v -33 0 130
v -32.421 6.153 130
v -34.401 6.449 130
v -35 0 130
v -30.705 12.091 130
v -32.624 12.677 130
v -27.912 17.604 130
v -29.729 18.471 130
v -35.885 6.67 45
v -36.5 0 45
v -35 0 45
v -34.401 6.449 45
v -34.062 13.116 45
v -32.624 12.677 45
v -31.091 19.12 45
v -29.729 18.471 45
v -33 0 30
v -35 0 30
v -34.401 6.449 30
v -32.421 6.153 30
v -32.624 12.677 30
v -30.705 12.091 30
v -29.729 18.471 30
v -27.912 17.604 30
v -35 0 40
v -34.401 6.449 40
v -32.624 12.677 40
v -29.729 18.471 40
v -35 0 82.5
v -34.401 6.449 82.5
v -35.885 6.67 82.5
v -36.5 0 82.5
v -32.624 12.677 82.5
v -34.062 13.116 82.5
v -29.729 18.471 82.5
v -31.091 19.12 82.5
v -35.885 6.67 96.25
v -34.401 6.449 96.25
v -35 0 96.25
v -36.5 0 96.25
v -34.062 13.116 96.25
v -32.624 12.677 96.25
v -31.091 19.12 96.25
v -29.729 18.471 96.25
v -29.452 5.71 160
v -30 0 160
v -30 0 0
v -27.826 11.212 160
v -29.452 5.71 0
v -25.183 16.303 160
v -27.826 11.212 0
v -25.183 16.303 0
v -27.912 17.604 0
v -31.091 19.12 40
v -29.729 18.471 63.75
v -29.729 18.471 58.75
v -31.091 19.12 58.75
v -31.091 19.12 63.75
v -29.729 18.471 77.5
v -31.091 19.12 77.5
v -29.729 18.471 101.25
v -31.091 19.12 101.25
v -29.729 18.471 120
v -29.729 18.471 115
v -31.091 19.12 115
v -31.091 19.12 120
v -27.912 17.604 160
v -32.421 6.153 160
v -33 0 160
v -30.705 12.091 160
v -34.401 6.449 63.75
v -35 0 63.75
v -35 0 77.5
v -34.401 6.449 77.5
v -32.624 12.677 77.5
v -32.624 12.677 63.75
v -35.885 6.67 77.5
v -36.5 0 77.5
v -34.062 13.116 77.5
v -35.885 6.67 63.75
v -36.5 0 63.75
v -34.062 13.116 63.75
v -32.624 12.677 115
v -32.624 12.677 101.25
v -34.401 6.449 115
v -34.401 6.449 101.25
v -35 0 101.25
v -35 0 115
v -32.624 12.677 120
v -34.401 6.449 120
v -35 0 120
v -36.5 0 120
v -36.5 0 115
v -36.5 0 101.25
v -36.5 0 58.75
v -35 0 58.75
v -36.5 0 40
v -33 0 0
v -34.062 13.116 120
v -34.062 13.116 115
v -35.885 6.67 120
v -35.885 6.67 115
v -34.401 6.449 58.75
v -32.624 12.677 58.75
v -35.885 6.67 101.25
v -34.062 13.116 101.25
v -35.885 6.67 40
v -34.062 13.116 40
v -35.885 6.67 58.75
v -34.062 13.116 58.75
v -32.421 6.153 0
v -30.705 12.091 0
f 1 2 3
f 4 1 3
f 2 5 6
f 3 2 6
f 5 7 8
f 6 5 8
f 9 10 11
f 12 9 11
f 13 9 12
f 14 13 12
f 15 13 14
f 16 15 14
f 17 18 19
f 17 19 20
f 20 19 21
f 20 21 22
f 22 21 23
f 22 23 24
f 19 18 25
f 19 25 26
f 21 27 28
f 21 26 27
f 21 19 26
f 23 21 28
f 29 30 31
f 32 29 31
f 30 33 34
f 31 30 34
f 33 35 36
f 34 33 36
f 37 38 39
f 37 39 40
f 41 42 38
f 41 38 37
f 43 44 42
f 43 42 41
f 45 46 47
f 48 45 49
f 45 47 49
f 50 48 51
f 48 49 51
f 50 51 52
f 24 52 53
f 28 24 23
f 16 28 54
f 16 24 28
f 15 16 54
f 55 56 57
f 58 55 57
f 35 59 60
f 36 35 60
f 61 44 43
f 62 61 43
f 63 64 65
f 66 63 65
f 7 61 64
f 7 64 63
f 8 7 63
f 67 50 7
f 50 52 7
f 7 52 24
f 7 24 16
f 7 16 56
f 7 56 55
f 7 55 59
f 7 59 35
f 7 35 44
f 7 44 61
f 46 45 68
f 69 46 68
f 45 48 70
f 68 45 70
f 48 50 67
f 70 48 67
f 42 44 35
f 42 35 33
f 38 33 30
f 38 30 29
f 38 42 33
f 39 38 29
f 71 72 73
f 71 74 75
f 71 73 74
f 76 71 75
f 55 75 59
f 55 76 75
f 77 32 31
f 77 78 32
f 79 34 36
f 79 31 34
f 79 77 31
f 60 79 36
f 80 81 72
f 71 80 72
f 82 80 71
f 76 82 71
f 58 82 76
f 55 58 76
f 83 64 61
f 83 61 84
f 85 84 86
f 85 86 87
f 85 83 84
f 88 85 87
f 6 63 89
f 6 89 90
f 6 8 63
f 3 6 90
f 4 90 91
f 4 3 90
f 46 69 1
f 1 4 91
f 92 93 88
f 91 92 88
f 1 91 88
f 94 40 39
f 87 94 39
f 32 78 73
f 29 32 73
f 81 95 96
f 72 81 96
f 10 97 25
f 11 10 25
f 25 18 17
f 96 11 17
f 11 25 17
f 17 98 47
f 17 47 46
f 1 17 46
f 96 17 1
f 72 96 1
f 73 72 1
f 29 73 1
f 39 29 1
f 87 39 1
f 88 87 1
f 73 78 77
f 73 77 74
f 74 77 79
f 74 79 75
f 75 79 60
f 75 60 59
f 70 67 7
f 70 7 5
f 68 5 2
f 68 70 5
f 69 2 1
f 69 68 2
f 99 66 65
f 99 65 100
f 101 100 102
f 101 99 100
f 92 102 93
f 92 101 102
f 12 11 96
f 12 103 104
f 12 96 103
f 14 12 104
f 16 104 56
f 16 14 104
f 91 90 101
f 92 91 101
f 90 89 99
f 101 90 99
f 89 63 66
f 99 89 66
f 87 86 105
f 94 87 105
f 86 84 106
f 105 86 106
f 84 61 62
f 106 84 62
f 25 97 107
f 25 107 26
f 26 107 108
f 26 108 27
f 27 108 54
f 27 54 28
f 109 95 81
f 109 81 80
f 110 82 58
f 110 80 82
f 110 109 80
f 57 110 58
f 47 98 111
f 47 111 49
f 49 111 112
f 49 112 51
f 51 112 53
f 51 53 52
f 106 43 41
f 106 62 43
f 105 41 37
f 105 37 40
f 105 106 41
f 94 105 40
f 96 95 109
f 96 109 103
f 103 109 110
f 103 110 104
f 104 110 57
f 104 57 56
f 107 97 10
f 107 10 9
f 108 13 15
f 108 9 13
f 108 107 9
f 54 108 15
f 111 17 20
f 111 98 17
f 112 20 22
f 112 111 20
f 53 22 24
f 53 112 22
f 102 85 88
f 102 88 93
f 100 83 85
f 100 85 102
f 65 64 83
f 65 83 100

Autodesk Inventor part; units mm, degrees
ref_plane "YZ Plane" through (0, 0, 0) normal (1, 0, 0) x (0, 1, 0)
ref_plane "XZ Plane" through (0, 0, 0) normal (0, 1, 0) x (-1, 0, 0)
ref_plane "XY Plane" through (0, 0, 0) normal (0, 0, 1) x (1, 0, 0)
sketch "Skizze1" plane through (0, 0, 0) normal (0, 0, 1) x (1, 0, 0)
  arc A0 (-15, 25.9808) -> (-30, 0) centre (0, 0) ccw
  line L0 (-15, 25.9808) -> (-16.8174, 28.3932)
  line L1 (-30, 0) -> (-33, 0)
  arc A1 (-16.8174, 28.3932) -> (-33, 0) centre (0, 0) ccw
extrude "Teil B1" add sketch "Skizze1" along normal blind 30
sketch "Skizze2" plane through (0, 0, 30) normal (0, 0, 1) x (1, 0, 0)
  arc A0 (-15, 25.9808) -> (-30, 0) centre (0, 0) ccw projected
  line L0 (-33, 0) -> (-30, 0) projected
  arc A1 (-15, 25.9808) -> (-30, 0) centre (0, 0) ccw
  arc A2 (-18.0278, 30) -> (-35, 0) centre (0, 0) ccw
  line L1 (-30, 0) -> (-35, 0)
  line L2 (-15, 25.9808) -> (-18.0278, 30)
  line L3 (-15, 25.9808) -> (-16.8174, 28.3932) projected
  dimension "d6" = 70
extrude "Teil C1" add sketch "Skizze2" along normal blind 10
sketch "Skizze3" plane through (0, 0, 40) normal (0, 0, 1) x (1, 0, 0)
  arc A0 (-15, 25.9808) -> (-30, 0) centre (0, 0) ccw projected
  line L0 (-33, 0) -> (-30, 0) projected
  arc A1 (-15, 25.9808) -> (-30, 0) centre (0, 0) ccw
  arc A2 (-18.935, 31.2044) -> (-36.5, 0) centre (0, 0) ccw
  line L1 (-30, 0) -> (-36.5, 0)
  line L2 (-15, 25.9808) -> (-16.8174, 28.3932) projected
  line L3 (-15, 25.9808) -> (-18.935, 31.2044)
  dimension "d9" = 73
extrude "Teil D1" add sketch "Skizze3" along normal blind 5
sketch "Skizze4" plane through (0, 0, 45) normal (0, 0, 1) x (1, 0, 0)
  arc A0 (-18.0278, 30) -> (-35, 0) centre (0, 0) ccw
  arc A1 (-15, 25.9808) -> (-30, 0) centre (0, 0) ccw projected
  arc A2 (-15, 25.9808) -> (-30, 0) centre (0, 0) ccw
  line L0 (-16.8174, 28.3932) -> (-18.0278, 30) projected
  line L1 (-15, 25.9808) -> (-18.0278, 30)
  line L2 (-36.5, 0) -> (-35, 0) projected
  line L3 (-30, 0) -> (-35, 0)
extrude "Teil E1" add sketch "Skizze4" along normal blind 13.75
sketch "Skizze5" plane through (0, 0, 58.75) normal (0, 0, 1) x (1, 0, 0)
  arc A0 (-15, 25.9808) -> (-30, 0) centre (0, 0) ccw projected
  arc A1 (-15, 25.9808) -> (-30, 0) centre (0, 0) ccw
  arc A2 (-18.935, 31.2044) -> (-36.5, 0) centre (0, 0) ccw projected
  line L0 (-36.5, 0) -> (-35, 0) projected
  arc A3 (-18.935, 31.2044) -> (-36.5, 0) centre (0, 0) ccw
  line L1 (-33, 0) -> (-30, 0) projected
  line L2 (-36.5, 0) -> (-30, 0)
  line L3 (-15, 25.9808) -> (-18.935, 31.2044)
  point P0 (-15, 25.9808)
extrude "Teil D2" add sketch "Skizze5" along normal blind 5
sketch "Skizze6" plane through (0, 0, 63.75) normal (0, 0, 1) x (1, 0, 0)
  line L0 (-33, 0) -> (-30, 0) projected
  arc A0 (-15, 25.9808) -> (-30, 0) centre (0, 0) ccw
  arc A1 (-18.0278, 30) -> (-35, 0) centre (0, 0) ccw projected
  arc A2 (-18.0278, 30) -> (-35, 0) centre (0, 0) ccw
  line L1 (-36.5, 0) -> (-35, 0) projected
  line L2 (-35, 0) -> (-30, 0)
  line L3 (-15, 25.9808) -> (-18.0278, 30)
  line L4 (-15, 25.9808) -> (-16.8174, 28.3932) projected
extrude "Extrusion6" add sketch "Skizze6" along normal blind 13.75
sketch "Skizze7" plane through (0, 0, 77.5) normal (0, 0, 1) x (1, 0, 0)
  arc A0 (-15, 25.9808) -> (-30, 0) centre (0, 0) ccw projected
  line L0 (-33, 0) -> (-30, 0) projected
  arc A1 (-15, 25.9808) -> (-30, 0) centre (0, 0) ccw
  line L1 (-18.0278, 30) -> (-18.935, 31.2044) projected
  line L2 (-36.5, 0) -> (-35, 0) projected
  arc A2 (-18.935, 31.2044) -> (-36.5, 0) centre (0, 0) ccw
  line L3 (-36.5, 0) -> (-30, 0)
  line L4 (-15, 25.9808) -> (-16.8174, 28.3932) projected
  line L5 (-18.935, 31.2044) -> (-15, 25.9808)
extrude "Extrusion7" add sketch "Skizze7" along normal blind 2.5
mirror "Spiegeln1" about plane through (-25.75, 15.6022, 80) normal (0, 0, 1)
sketch "Skizze8" plane through (-33, 0, 160) normal (0, 0, 1) x (1, 0, 0)
  arc A0 (18, 25.9808) -> (3, 0) centre (33, 0) ccw projected
  line L0 (3, 0) -> (13, 17.3205)
  line L1 (13, 17.3205) -> (4.1881, 22.4081)
  arc A1 (14.065, 31.2044) -> (-3.5, 0) centre (33, 0) ccw projected
  arc A2 (18, 25.9808) -> (9.8826, 19.1203) centre (33, 0) ccw
  arc A3 (14.065, 31.2044) -> (4.1881, 22.4081) centre (33, 0) ccw
  line L2 (14.065, 31.2044) -> (18, 25.9808)
  dimension "d21" = 20
extrude "Extrusion8" cut sketch "Skizze8" against normal through all contours A0 L1 A1 L2
sketch "Skizze9" plane through (-33, 0, 160) normal (0, 0, 1) x (1, 0, 0)
  line L0 (0, 0) -> (3, 0) projected
  arc A0 (9.8826, 19.1203) -> (3, 0) centre (33, 0) ccw projected
  arc A1 (3, 0) -> (7.8167, 16.3034) centre (-4.5602, 11.0968) ccw
  line L1 (7.8167, 16.3034) -> (1.9088, 19.1203)
  arc A2 (4.1881, 22.4081) -> (-3.5, 0) centre (33, 0) ccw projected
  line L2 (4.1881, 22.4081) -> (9.8826, 19.1203)
  arc A3 (4.1881, 22.4081) -> (1.9088, 19.1203) centre (33, 0) ccw
  arc A4 (9.8826, 19.1203) -> (7.8167, 16.3034) centre (33, 0) ccw
  dimension "d24" = 17
extrude "Extrusion9" cut sketch "Skizze9" against normal through all contours A0 L1 A2 L2
properties part number "Bumper_V1"
